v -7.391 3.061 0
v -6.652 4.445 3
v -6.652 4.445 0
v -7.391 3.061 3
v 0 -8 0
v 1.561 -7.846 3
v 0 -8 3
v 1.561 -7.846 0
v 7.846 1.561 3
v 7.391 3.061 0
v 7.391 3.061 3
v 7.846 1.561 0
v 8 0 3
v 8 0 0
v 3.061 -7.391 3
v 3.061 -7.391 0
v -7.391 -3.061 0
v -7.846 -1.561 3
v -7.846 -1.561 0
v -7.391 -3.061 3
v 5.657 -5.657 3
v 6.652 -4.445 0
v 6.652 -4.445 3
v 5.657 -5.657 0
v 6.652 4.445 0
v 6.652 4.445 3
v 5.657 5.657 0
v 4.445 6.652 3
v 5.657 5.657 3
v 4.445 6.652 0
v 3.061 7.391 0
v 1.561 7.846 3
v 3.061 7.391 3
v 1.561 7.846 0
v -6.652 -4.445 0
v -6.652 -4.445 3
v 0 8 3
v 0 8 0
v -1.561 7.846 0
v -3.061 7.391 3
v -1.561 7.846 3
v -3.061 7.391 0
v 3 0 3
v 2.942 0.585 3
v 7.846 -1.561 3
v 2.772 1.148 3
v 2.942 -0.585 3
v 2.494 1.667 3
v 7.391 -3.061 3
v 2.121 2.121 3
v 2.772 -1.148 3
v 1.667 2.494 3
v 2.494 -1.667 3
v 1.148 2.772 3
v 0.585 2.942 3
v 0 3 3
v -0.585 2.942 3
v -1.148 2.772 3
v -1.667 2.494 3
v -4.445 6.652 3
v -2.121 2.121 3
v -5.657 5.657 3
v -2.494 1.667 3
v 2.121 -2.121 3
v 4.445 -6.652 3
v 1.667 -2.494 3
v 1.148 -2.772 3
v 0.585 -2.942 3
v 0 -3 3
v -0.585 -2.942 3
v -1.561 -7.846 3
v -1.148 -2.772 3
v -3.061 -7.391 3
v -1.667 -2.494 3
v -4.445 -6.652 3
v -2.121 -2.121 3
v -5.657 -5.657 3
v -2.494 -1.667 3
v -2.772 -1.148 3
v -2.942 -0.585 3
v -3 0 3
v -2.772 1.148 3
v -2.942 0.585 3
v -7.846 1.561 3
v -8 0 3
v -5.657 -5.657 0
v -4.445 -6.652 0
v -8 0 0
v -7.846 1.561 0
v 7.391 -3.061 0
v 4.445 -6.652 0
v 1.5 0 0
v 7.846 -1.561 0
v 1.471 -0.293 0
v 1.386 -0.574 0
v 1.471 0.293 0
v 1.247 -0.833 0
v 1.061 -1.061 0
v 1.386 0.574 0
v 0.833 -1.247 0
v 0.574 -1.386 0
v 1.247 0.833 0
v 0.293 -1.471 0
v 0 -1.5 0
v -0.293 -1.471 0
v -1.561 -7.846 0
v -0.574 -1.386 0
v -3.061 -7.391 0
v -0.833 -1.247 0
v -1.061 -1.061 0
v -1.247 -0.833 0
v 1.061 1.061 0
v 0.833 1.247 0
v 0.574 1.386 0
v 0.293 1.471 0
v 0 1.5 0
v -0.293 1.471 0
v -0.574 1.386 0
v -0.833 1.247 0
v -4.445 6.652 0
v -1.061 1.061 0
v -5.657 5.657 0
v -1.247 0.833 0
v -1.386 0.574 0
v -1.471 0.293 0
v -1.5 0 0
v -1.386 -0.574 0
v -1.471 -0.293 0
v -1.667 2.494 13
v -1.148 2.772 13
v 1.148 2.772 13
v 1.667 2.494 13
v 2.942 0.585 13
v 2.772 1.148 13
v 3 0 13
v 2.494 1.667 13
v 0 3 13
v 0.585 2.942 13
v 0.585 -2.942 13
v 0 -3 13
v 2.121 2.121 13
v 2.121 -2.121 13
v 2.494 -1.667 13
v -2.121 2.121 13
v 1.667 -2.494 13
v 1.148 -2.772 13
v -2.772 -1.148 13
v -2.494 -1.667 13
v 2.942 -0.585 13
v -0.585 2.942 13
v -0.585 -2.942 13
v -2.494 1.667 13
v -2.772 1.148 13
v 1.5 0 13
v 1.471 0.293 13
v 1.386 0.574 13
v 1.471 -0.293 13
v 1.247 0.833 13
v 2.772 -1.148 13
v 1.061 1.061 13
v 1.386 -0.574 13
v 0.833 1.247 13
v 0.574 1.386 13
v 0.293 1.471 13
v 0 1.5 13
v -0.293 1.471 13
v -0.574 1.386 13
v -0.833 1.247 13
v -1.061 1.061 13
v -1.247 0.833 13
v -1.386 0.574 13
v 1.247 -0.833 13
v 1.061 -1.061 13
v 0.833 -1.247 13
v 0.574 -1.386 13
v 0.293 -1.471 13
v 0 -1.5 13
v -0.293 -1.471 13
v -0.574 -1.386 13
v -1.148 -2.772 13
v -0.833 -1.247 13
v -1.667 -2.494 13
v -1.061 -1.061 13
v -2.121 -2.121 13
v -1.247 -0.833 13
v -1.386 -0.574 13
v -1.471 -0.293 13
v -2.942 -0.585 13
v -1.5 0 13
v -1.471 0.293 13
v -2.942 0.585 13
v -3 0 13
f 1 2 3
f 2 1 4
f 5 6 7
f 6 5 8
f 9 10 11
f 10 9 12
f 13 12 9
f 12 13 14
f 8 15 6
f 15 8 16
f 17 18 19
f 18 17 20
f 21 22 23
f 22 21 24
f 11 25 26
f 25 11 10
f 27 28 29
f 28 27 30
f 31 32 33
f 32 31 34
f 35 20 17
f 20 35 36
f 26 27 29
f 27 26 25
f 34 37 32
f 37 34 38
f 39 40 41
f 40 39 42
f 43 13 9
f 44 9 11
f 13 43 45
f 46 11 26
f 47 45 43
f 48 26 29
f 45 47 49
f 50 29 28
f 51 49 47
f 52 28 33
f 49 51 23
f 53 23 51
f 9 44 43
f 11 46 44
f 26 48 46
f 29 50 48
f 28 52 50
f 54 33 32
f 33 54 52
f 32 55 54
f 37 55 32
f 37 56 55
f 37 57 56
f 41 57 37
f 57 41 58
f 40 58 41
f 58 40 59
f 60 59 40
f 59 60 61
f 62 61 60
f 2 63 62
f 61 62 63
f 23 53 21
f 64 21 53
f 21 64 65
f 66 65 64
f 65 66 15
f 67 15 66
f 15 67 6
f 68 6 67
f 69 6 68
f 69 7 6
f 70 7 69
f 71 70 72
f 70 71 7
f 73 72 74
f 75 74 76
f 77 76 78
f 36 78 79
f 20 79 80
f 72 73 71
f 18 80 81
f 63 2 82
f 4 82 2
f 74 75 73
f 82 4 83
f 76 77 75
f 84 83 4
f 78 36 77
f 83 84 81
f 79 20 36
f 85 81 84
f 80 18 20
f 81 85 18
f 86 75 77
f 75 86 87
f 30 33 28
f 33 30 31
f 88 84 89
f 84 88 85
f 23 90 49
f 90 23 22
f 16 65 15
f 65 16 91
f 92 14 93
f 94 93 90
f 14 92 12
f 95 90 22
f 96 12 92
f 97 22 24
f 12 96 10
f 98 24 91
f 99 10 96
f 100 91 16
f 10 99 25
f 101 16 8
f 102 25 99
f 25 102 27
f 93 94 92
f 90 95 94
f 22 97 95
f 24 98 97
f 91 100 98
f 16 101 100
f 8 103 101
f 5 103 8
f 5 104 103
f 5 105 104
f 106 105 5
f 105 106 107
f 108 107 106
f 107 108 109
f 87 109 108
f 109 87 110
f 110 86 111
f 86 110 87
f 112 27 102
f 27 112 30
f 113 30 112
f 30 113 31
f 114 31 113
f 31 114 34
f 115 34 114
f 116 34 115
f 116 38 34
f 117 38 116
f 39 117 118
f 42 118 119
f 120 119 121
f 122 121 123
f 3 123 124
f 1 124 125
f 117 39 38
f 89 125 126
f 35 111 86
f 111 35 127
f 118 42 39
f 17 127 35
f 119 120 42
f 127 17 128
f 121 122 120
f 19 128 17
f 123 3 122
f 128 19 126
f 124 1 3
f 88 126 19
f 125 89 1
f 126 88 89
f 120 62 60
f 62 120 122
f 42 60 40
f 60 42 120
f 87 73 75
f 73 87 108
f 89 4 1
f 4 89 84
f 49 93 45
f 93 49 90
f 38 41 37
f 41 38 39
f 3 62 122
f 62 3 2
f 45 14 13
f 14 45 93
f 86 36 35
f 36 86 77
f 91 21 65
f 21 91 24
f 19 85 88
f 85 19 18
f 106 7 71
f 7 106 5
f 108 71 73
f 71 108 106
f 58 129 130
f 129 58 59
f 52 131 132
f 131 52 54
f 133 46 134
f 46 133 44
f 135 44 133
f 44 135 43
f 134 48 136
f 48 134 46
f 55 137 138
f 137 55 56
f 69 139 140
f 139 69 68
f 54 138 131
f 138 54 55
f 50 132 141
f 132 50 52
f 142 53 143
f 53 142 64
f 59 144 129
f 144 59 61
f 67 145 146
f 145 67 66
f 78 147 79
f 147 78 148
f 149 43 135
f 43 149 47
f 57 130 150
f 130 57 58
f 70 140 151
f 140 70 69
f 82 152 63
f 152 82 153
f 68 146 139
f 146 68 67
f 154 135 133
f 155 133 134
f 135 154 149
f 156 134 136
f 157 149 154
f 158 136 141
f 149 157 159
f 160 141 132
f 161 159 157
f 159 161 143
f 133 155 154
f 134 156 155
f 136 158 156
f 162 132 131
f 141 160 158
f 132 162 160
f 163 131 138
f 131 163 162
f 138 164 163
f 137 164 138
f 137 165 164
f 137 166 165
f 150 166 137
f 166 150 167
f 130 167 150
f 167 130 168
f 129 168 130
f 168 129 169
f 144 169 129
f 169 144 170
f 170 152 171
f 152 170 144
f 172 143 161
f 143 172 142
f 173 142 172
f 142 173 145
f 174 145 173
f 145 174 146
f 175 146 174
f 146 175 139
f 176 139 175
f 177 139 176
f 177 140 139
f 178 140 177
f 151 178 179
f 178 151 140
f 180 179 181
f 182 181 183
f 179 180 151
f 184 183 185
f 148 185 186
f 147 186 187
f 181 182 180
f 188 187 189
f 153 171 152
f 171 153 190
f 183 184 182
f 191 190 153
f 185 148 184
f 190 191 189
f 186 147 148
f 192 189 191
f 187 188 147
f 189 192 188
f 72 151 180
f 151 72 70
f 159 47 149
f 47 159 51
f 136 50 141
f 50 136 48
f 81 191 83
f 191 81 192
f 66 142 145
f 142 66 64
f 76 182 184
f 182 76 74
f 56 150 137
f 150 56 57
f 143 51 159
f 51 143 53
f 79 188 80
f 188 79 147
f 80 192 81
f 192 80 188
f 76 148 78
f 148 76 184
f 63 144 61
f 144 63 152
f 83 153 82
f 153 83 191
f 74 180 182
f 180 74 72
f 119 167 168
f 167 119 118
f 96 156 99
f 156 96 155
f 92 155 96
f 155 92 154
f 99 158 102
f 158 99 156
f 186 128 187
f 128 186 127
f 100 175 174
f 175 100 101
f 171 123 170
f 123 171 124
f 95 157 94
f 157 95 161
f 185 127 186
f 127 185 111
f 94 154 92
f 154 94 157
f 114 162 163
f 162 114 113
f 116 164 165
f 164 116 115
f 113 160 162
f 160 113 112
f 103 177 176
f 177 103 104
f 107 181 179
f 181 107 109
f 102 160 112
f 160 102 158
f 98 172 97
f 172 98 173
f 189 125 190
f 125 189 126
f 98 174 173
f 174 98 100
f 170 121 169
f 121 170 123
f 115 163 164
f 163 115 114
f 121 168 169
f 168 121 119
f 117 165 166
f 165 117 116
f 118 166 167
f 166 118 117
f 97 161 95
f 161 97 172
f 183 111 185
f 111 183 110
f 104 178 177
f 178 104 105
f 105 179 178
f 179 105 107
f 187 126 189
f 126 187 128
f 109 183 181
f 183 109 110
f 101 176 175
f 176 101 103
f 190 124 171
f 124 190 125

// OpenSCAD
$fn = 32;

// ----------------------------------------------------------------------
// Micro post: flanged post, 5-20 mm class
// ----------------------------------------------------------------------

// --- parameters (mm) ---
post_d = 6;               // post diameter
post_h = 10;              // post height above the flange
flange_d = 16;            // flange diameter
flange_t = 3;             // flange thickness
bore_d = 3;               // through bore
fit_tol = 0.05;           // tolerance for press fits, mm
free_tol = 0.3;           // tolerance for clearance fits, mm

total_h = post_h + flange_t;  // overall height

difference() {
  union() {
    cylinder(h = flange_t, d = flange_d);
    translate([0, 0, flange_t]) cylinder(h = post_h, d = post_d);
  }
  translate([0, 0, -1]) cylinder(h = total_h + 2, d = bore_d);
}
